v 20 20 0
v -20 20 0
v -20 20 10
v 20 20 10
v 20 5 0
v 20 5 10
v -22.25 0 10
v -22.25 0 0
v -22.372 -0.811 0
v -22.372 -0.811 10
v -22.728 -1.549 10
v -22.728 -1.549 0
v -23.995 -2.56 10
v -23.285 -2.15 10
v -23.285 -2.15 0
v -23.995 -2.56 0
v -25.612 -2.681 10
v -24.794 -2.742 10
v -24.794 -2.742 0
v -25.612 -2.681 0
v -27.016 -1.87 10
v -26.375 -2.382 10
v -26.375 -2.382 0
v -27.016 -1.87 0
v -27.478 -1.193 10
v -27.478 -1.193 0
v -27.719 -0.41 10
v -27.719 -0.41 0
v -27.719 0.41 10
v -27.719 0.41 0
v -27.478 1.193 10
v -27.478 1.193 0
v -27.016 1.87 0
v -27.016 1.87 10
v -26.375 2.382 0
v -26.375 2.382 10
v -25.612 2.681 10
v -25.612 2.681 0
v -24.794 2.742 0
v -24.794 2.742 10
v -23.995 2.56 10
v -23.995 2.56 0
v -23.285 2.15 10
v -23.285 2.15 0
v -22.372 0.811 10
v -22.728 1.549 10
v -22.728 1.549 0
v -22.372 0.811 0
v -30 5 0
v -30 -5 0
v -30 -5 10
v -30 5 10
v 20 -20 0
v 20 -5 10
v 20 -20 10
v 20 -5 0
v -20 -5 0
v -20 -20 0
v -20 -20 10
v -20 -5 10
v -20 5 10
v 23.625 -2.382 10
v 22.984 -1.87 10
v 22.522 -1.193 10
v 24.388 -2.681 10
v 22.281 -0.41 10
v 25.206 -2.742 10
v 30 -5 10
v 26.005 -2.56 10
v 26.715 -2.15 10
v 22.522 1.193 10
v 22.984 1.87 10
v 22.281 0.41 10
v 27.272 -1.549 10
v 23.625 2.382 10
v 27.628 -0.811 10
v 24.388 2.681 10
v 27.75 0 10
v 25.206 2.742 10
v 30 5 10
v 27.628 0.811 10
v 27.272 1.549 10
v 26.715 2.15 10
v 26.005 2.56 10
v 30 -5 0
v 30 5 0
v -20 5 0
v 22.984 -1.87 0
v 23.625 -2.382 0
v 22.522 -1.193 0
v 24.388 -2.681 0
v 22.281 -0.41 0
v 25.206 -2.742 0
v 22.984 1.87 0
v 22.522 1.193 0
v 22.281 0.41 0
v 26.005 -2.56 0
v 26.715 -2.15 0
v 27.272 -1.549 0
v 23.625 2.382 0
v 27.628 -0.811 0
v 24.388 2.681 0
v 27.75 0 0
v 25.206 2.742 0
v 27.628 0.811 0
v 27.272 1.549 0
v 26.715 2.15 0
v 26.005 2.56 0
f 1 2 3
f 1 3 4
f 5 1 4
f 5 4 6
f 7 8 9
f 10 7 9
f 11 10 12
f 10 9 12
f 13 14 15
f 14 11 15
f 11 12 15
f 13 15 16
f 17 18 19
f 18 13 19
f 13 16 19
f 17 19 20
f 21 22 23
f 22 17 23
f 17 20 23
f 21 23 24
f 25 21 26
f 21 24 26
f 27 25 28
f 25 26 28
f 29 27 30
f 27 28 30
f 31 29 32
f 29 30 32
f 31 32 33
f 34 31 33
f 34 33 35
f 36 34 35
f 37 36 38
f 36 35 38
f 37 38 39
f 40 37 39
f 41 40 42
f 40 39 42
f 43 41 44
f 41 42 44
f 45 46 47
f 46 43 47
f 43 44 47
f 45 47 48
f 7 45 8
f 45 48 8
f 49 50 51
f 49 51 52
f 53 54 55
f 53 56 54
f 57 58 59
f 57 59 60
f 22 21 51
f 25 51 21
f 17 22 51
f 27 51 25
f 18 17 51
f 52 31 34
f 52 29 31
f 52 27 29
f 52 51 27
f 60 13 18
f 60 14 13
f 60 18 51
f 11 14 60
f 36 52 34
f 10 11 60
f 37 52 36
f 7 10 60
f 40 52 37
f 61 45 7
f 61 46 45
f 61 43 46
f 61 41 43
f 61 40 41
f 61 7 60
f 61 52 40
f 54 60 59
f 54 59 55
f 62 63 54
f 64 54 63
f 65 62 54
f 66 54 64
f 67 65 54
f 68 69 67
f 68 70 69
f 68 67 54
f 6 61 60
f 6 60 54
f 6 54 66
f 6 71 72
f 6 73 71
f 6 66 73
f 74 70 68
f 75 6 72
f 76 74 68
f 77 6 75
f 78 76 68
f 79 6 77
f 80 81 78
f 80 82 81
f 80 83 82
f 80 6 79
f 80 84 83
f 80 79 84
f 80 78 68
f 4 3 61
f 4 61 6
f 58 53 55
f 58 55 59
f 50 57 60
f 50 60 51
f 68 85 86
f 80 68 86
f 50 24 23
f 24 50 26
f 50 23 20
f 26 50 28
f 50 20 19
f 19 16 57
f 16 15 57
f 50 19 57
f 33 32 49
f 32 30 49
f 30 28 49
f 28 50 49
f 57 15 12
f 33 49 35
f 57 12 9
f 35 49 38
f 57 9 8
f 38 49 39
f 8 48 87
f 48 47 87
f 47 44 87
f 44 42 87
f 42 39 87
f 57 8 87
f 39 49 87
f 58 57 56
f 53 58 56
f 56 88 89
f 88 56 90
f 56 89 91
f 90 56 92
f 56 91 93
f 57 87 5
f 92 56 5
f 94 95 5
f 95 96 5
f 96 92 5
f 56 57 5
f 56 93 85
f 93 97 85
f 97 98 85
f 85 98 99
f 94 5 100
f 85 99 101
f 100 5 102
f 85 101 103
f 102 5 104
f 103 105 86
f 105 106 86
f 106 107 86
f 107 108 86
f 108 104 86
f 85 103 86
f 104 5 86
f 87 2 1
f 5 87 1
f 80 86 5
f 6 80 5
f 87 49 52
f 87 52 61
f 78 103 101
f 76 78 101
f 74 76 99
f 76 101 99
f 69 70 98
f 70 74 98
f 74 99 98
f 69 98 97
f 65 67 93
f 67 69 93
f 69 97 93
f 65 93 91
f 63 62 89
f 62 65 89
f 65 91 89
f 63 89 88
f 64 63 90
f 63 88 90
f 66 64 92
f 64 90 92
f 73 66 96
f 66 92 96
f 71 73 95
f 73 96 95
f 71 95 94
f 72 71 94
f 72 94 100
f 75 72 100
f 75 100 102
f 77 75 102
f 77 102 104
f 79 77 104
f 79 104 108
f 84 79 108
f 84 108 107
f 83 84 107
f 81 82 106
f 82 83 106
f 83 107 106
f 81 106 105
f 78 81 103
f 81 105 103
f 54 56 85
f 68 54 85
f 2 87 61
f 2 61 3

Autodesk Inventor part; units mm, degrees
ref_plane "YZ Plane" through (0, 0, 0) normal (1, 0, 0) x (0, 1, 0)
ref_plane "XZ Plane" through (0, 0, 0) normal (0, 1, 0) x (-1, 0, 0)
ref_plane "XY Plane" through (0, 0, 0) normal (0, 0, 1) x (1, 0, 0)
sketch "Sketch1" plane through (0, 0, 0) normal (0, 0, 1) x (1, 0, 0)
  line L0 (-20, 20) -> (20, 20)
  line L1 (20, 20) -> (20, -20)
  line L2 (20, -20) -> (-20, -20)
  line L3 (-20, -20) -> (-20, 20)
  line L4 (-20, 20) -> (20, -20) construction
  line L5 (20, 20) -> (-20, -20) construction
  line L6 (20, -5) -> (30, -5)
  line L7 (30, -5) -> (30, 5)
  line L8 (30, 5) -> (20, 5)
  line L9 (20, 5) -> (20, -5)
  line L10 (-20, -5) -> (-30, -5)
  line L11 (-30, -5) -> (-30, 5)
  line L12 (-30, 5) -> (-20, 5)
  line L13 (-20, 5) -> (-20, -5)
  circle A0 centre (-25, 0) radius 2.75
  circle A1 centre (25, 0) radius 2.75
  point P0 (0, 0)
  point P1 (30, 0)
  point P2 (20, 0)
  point P3 (-25, 5)
  point P4 (25, 5)
  dimension "d0" = 40
  dimension "d1" = 40
  dimension "d2" = 10
  dimension "d3" = 10
  dimension "d4" = 10
  dimension "d5" = 5.5
  dimension "d6" = 5.5
extrude "Extrusion1" add sketch "Sketch1" along normal blind 10
properties part number "cap5V"
